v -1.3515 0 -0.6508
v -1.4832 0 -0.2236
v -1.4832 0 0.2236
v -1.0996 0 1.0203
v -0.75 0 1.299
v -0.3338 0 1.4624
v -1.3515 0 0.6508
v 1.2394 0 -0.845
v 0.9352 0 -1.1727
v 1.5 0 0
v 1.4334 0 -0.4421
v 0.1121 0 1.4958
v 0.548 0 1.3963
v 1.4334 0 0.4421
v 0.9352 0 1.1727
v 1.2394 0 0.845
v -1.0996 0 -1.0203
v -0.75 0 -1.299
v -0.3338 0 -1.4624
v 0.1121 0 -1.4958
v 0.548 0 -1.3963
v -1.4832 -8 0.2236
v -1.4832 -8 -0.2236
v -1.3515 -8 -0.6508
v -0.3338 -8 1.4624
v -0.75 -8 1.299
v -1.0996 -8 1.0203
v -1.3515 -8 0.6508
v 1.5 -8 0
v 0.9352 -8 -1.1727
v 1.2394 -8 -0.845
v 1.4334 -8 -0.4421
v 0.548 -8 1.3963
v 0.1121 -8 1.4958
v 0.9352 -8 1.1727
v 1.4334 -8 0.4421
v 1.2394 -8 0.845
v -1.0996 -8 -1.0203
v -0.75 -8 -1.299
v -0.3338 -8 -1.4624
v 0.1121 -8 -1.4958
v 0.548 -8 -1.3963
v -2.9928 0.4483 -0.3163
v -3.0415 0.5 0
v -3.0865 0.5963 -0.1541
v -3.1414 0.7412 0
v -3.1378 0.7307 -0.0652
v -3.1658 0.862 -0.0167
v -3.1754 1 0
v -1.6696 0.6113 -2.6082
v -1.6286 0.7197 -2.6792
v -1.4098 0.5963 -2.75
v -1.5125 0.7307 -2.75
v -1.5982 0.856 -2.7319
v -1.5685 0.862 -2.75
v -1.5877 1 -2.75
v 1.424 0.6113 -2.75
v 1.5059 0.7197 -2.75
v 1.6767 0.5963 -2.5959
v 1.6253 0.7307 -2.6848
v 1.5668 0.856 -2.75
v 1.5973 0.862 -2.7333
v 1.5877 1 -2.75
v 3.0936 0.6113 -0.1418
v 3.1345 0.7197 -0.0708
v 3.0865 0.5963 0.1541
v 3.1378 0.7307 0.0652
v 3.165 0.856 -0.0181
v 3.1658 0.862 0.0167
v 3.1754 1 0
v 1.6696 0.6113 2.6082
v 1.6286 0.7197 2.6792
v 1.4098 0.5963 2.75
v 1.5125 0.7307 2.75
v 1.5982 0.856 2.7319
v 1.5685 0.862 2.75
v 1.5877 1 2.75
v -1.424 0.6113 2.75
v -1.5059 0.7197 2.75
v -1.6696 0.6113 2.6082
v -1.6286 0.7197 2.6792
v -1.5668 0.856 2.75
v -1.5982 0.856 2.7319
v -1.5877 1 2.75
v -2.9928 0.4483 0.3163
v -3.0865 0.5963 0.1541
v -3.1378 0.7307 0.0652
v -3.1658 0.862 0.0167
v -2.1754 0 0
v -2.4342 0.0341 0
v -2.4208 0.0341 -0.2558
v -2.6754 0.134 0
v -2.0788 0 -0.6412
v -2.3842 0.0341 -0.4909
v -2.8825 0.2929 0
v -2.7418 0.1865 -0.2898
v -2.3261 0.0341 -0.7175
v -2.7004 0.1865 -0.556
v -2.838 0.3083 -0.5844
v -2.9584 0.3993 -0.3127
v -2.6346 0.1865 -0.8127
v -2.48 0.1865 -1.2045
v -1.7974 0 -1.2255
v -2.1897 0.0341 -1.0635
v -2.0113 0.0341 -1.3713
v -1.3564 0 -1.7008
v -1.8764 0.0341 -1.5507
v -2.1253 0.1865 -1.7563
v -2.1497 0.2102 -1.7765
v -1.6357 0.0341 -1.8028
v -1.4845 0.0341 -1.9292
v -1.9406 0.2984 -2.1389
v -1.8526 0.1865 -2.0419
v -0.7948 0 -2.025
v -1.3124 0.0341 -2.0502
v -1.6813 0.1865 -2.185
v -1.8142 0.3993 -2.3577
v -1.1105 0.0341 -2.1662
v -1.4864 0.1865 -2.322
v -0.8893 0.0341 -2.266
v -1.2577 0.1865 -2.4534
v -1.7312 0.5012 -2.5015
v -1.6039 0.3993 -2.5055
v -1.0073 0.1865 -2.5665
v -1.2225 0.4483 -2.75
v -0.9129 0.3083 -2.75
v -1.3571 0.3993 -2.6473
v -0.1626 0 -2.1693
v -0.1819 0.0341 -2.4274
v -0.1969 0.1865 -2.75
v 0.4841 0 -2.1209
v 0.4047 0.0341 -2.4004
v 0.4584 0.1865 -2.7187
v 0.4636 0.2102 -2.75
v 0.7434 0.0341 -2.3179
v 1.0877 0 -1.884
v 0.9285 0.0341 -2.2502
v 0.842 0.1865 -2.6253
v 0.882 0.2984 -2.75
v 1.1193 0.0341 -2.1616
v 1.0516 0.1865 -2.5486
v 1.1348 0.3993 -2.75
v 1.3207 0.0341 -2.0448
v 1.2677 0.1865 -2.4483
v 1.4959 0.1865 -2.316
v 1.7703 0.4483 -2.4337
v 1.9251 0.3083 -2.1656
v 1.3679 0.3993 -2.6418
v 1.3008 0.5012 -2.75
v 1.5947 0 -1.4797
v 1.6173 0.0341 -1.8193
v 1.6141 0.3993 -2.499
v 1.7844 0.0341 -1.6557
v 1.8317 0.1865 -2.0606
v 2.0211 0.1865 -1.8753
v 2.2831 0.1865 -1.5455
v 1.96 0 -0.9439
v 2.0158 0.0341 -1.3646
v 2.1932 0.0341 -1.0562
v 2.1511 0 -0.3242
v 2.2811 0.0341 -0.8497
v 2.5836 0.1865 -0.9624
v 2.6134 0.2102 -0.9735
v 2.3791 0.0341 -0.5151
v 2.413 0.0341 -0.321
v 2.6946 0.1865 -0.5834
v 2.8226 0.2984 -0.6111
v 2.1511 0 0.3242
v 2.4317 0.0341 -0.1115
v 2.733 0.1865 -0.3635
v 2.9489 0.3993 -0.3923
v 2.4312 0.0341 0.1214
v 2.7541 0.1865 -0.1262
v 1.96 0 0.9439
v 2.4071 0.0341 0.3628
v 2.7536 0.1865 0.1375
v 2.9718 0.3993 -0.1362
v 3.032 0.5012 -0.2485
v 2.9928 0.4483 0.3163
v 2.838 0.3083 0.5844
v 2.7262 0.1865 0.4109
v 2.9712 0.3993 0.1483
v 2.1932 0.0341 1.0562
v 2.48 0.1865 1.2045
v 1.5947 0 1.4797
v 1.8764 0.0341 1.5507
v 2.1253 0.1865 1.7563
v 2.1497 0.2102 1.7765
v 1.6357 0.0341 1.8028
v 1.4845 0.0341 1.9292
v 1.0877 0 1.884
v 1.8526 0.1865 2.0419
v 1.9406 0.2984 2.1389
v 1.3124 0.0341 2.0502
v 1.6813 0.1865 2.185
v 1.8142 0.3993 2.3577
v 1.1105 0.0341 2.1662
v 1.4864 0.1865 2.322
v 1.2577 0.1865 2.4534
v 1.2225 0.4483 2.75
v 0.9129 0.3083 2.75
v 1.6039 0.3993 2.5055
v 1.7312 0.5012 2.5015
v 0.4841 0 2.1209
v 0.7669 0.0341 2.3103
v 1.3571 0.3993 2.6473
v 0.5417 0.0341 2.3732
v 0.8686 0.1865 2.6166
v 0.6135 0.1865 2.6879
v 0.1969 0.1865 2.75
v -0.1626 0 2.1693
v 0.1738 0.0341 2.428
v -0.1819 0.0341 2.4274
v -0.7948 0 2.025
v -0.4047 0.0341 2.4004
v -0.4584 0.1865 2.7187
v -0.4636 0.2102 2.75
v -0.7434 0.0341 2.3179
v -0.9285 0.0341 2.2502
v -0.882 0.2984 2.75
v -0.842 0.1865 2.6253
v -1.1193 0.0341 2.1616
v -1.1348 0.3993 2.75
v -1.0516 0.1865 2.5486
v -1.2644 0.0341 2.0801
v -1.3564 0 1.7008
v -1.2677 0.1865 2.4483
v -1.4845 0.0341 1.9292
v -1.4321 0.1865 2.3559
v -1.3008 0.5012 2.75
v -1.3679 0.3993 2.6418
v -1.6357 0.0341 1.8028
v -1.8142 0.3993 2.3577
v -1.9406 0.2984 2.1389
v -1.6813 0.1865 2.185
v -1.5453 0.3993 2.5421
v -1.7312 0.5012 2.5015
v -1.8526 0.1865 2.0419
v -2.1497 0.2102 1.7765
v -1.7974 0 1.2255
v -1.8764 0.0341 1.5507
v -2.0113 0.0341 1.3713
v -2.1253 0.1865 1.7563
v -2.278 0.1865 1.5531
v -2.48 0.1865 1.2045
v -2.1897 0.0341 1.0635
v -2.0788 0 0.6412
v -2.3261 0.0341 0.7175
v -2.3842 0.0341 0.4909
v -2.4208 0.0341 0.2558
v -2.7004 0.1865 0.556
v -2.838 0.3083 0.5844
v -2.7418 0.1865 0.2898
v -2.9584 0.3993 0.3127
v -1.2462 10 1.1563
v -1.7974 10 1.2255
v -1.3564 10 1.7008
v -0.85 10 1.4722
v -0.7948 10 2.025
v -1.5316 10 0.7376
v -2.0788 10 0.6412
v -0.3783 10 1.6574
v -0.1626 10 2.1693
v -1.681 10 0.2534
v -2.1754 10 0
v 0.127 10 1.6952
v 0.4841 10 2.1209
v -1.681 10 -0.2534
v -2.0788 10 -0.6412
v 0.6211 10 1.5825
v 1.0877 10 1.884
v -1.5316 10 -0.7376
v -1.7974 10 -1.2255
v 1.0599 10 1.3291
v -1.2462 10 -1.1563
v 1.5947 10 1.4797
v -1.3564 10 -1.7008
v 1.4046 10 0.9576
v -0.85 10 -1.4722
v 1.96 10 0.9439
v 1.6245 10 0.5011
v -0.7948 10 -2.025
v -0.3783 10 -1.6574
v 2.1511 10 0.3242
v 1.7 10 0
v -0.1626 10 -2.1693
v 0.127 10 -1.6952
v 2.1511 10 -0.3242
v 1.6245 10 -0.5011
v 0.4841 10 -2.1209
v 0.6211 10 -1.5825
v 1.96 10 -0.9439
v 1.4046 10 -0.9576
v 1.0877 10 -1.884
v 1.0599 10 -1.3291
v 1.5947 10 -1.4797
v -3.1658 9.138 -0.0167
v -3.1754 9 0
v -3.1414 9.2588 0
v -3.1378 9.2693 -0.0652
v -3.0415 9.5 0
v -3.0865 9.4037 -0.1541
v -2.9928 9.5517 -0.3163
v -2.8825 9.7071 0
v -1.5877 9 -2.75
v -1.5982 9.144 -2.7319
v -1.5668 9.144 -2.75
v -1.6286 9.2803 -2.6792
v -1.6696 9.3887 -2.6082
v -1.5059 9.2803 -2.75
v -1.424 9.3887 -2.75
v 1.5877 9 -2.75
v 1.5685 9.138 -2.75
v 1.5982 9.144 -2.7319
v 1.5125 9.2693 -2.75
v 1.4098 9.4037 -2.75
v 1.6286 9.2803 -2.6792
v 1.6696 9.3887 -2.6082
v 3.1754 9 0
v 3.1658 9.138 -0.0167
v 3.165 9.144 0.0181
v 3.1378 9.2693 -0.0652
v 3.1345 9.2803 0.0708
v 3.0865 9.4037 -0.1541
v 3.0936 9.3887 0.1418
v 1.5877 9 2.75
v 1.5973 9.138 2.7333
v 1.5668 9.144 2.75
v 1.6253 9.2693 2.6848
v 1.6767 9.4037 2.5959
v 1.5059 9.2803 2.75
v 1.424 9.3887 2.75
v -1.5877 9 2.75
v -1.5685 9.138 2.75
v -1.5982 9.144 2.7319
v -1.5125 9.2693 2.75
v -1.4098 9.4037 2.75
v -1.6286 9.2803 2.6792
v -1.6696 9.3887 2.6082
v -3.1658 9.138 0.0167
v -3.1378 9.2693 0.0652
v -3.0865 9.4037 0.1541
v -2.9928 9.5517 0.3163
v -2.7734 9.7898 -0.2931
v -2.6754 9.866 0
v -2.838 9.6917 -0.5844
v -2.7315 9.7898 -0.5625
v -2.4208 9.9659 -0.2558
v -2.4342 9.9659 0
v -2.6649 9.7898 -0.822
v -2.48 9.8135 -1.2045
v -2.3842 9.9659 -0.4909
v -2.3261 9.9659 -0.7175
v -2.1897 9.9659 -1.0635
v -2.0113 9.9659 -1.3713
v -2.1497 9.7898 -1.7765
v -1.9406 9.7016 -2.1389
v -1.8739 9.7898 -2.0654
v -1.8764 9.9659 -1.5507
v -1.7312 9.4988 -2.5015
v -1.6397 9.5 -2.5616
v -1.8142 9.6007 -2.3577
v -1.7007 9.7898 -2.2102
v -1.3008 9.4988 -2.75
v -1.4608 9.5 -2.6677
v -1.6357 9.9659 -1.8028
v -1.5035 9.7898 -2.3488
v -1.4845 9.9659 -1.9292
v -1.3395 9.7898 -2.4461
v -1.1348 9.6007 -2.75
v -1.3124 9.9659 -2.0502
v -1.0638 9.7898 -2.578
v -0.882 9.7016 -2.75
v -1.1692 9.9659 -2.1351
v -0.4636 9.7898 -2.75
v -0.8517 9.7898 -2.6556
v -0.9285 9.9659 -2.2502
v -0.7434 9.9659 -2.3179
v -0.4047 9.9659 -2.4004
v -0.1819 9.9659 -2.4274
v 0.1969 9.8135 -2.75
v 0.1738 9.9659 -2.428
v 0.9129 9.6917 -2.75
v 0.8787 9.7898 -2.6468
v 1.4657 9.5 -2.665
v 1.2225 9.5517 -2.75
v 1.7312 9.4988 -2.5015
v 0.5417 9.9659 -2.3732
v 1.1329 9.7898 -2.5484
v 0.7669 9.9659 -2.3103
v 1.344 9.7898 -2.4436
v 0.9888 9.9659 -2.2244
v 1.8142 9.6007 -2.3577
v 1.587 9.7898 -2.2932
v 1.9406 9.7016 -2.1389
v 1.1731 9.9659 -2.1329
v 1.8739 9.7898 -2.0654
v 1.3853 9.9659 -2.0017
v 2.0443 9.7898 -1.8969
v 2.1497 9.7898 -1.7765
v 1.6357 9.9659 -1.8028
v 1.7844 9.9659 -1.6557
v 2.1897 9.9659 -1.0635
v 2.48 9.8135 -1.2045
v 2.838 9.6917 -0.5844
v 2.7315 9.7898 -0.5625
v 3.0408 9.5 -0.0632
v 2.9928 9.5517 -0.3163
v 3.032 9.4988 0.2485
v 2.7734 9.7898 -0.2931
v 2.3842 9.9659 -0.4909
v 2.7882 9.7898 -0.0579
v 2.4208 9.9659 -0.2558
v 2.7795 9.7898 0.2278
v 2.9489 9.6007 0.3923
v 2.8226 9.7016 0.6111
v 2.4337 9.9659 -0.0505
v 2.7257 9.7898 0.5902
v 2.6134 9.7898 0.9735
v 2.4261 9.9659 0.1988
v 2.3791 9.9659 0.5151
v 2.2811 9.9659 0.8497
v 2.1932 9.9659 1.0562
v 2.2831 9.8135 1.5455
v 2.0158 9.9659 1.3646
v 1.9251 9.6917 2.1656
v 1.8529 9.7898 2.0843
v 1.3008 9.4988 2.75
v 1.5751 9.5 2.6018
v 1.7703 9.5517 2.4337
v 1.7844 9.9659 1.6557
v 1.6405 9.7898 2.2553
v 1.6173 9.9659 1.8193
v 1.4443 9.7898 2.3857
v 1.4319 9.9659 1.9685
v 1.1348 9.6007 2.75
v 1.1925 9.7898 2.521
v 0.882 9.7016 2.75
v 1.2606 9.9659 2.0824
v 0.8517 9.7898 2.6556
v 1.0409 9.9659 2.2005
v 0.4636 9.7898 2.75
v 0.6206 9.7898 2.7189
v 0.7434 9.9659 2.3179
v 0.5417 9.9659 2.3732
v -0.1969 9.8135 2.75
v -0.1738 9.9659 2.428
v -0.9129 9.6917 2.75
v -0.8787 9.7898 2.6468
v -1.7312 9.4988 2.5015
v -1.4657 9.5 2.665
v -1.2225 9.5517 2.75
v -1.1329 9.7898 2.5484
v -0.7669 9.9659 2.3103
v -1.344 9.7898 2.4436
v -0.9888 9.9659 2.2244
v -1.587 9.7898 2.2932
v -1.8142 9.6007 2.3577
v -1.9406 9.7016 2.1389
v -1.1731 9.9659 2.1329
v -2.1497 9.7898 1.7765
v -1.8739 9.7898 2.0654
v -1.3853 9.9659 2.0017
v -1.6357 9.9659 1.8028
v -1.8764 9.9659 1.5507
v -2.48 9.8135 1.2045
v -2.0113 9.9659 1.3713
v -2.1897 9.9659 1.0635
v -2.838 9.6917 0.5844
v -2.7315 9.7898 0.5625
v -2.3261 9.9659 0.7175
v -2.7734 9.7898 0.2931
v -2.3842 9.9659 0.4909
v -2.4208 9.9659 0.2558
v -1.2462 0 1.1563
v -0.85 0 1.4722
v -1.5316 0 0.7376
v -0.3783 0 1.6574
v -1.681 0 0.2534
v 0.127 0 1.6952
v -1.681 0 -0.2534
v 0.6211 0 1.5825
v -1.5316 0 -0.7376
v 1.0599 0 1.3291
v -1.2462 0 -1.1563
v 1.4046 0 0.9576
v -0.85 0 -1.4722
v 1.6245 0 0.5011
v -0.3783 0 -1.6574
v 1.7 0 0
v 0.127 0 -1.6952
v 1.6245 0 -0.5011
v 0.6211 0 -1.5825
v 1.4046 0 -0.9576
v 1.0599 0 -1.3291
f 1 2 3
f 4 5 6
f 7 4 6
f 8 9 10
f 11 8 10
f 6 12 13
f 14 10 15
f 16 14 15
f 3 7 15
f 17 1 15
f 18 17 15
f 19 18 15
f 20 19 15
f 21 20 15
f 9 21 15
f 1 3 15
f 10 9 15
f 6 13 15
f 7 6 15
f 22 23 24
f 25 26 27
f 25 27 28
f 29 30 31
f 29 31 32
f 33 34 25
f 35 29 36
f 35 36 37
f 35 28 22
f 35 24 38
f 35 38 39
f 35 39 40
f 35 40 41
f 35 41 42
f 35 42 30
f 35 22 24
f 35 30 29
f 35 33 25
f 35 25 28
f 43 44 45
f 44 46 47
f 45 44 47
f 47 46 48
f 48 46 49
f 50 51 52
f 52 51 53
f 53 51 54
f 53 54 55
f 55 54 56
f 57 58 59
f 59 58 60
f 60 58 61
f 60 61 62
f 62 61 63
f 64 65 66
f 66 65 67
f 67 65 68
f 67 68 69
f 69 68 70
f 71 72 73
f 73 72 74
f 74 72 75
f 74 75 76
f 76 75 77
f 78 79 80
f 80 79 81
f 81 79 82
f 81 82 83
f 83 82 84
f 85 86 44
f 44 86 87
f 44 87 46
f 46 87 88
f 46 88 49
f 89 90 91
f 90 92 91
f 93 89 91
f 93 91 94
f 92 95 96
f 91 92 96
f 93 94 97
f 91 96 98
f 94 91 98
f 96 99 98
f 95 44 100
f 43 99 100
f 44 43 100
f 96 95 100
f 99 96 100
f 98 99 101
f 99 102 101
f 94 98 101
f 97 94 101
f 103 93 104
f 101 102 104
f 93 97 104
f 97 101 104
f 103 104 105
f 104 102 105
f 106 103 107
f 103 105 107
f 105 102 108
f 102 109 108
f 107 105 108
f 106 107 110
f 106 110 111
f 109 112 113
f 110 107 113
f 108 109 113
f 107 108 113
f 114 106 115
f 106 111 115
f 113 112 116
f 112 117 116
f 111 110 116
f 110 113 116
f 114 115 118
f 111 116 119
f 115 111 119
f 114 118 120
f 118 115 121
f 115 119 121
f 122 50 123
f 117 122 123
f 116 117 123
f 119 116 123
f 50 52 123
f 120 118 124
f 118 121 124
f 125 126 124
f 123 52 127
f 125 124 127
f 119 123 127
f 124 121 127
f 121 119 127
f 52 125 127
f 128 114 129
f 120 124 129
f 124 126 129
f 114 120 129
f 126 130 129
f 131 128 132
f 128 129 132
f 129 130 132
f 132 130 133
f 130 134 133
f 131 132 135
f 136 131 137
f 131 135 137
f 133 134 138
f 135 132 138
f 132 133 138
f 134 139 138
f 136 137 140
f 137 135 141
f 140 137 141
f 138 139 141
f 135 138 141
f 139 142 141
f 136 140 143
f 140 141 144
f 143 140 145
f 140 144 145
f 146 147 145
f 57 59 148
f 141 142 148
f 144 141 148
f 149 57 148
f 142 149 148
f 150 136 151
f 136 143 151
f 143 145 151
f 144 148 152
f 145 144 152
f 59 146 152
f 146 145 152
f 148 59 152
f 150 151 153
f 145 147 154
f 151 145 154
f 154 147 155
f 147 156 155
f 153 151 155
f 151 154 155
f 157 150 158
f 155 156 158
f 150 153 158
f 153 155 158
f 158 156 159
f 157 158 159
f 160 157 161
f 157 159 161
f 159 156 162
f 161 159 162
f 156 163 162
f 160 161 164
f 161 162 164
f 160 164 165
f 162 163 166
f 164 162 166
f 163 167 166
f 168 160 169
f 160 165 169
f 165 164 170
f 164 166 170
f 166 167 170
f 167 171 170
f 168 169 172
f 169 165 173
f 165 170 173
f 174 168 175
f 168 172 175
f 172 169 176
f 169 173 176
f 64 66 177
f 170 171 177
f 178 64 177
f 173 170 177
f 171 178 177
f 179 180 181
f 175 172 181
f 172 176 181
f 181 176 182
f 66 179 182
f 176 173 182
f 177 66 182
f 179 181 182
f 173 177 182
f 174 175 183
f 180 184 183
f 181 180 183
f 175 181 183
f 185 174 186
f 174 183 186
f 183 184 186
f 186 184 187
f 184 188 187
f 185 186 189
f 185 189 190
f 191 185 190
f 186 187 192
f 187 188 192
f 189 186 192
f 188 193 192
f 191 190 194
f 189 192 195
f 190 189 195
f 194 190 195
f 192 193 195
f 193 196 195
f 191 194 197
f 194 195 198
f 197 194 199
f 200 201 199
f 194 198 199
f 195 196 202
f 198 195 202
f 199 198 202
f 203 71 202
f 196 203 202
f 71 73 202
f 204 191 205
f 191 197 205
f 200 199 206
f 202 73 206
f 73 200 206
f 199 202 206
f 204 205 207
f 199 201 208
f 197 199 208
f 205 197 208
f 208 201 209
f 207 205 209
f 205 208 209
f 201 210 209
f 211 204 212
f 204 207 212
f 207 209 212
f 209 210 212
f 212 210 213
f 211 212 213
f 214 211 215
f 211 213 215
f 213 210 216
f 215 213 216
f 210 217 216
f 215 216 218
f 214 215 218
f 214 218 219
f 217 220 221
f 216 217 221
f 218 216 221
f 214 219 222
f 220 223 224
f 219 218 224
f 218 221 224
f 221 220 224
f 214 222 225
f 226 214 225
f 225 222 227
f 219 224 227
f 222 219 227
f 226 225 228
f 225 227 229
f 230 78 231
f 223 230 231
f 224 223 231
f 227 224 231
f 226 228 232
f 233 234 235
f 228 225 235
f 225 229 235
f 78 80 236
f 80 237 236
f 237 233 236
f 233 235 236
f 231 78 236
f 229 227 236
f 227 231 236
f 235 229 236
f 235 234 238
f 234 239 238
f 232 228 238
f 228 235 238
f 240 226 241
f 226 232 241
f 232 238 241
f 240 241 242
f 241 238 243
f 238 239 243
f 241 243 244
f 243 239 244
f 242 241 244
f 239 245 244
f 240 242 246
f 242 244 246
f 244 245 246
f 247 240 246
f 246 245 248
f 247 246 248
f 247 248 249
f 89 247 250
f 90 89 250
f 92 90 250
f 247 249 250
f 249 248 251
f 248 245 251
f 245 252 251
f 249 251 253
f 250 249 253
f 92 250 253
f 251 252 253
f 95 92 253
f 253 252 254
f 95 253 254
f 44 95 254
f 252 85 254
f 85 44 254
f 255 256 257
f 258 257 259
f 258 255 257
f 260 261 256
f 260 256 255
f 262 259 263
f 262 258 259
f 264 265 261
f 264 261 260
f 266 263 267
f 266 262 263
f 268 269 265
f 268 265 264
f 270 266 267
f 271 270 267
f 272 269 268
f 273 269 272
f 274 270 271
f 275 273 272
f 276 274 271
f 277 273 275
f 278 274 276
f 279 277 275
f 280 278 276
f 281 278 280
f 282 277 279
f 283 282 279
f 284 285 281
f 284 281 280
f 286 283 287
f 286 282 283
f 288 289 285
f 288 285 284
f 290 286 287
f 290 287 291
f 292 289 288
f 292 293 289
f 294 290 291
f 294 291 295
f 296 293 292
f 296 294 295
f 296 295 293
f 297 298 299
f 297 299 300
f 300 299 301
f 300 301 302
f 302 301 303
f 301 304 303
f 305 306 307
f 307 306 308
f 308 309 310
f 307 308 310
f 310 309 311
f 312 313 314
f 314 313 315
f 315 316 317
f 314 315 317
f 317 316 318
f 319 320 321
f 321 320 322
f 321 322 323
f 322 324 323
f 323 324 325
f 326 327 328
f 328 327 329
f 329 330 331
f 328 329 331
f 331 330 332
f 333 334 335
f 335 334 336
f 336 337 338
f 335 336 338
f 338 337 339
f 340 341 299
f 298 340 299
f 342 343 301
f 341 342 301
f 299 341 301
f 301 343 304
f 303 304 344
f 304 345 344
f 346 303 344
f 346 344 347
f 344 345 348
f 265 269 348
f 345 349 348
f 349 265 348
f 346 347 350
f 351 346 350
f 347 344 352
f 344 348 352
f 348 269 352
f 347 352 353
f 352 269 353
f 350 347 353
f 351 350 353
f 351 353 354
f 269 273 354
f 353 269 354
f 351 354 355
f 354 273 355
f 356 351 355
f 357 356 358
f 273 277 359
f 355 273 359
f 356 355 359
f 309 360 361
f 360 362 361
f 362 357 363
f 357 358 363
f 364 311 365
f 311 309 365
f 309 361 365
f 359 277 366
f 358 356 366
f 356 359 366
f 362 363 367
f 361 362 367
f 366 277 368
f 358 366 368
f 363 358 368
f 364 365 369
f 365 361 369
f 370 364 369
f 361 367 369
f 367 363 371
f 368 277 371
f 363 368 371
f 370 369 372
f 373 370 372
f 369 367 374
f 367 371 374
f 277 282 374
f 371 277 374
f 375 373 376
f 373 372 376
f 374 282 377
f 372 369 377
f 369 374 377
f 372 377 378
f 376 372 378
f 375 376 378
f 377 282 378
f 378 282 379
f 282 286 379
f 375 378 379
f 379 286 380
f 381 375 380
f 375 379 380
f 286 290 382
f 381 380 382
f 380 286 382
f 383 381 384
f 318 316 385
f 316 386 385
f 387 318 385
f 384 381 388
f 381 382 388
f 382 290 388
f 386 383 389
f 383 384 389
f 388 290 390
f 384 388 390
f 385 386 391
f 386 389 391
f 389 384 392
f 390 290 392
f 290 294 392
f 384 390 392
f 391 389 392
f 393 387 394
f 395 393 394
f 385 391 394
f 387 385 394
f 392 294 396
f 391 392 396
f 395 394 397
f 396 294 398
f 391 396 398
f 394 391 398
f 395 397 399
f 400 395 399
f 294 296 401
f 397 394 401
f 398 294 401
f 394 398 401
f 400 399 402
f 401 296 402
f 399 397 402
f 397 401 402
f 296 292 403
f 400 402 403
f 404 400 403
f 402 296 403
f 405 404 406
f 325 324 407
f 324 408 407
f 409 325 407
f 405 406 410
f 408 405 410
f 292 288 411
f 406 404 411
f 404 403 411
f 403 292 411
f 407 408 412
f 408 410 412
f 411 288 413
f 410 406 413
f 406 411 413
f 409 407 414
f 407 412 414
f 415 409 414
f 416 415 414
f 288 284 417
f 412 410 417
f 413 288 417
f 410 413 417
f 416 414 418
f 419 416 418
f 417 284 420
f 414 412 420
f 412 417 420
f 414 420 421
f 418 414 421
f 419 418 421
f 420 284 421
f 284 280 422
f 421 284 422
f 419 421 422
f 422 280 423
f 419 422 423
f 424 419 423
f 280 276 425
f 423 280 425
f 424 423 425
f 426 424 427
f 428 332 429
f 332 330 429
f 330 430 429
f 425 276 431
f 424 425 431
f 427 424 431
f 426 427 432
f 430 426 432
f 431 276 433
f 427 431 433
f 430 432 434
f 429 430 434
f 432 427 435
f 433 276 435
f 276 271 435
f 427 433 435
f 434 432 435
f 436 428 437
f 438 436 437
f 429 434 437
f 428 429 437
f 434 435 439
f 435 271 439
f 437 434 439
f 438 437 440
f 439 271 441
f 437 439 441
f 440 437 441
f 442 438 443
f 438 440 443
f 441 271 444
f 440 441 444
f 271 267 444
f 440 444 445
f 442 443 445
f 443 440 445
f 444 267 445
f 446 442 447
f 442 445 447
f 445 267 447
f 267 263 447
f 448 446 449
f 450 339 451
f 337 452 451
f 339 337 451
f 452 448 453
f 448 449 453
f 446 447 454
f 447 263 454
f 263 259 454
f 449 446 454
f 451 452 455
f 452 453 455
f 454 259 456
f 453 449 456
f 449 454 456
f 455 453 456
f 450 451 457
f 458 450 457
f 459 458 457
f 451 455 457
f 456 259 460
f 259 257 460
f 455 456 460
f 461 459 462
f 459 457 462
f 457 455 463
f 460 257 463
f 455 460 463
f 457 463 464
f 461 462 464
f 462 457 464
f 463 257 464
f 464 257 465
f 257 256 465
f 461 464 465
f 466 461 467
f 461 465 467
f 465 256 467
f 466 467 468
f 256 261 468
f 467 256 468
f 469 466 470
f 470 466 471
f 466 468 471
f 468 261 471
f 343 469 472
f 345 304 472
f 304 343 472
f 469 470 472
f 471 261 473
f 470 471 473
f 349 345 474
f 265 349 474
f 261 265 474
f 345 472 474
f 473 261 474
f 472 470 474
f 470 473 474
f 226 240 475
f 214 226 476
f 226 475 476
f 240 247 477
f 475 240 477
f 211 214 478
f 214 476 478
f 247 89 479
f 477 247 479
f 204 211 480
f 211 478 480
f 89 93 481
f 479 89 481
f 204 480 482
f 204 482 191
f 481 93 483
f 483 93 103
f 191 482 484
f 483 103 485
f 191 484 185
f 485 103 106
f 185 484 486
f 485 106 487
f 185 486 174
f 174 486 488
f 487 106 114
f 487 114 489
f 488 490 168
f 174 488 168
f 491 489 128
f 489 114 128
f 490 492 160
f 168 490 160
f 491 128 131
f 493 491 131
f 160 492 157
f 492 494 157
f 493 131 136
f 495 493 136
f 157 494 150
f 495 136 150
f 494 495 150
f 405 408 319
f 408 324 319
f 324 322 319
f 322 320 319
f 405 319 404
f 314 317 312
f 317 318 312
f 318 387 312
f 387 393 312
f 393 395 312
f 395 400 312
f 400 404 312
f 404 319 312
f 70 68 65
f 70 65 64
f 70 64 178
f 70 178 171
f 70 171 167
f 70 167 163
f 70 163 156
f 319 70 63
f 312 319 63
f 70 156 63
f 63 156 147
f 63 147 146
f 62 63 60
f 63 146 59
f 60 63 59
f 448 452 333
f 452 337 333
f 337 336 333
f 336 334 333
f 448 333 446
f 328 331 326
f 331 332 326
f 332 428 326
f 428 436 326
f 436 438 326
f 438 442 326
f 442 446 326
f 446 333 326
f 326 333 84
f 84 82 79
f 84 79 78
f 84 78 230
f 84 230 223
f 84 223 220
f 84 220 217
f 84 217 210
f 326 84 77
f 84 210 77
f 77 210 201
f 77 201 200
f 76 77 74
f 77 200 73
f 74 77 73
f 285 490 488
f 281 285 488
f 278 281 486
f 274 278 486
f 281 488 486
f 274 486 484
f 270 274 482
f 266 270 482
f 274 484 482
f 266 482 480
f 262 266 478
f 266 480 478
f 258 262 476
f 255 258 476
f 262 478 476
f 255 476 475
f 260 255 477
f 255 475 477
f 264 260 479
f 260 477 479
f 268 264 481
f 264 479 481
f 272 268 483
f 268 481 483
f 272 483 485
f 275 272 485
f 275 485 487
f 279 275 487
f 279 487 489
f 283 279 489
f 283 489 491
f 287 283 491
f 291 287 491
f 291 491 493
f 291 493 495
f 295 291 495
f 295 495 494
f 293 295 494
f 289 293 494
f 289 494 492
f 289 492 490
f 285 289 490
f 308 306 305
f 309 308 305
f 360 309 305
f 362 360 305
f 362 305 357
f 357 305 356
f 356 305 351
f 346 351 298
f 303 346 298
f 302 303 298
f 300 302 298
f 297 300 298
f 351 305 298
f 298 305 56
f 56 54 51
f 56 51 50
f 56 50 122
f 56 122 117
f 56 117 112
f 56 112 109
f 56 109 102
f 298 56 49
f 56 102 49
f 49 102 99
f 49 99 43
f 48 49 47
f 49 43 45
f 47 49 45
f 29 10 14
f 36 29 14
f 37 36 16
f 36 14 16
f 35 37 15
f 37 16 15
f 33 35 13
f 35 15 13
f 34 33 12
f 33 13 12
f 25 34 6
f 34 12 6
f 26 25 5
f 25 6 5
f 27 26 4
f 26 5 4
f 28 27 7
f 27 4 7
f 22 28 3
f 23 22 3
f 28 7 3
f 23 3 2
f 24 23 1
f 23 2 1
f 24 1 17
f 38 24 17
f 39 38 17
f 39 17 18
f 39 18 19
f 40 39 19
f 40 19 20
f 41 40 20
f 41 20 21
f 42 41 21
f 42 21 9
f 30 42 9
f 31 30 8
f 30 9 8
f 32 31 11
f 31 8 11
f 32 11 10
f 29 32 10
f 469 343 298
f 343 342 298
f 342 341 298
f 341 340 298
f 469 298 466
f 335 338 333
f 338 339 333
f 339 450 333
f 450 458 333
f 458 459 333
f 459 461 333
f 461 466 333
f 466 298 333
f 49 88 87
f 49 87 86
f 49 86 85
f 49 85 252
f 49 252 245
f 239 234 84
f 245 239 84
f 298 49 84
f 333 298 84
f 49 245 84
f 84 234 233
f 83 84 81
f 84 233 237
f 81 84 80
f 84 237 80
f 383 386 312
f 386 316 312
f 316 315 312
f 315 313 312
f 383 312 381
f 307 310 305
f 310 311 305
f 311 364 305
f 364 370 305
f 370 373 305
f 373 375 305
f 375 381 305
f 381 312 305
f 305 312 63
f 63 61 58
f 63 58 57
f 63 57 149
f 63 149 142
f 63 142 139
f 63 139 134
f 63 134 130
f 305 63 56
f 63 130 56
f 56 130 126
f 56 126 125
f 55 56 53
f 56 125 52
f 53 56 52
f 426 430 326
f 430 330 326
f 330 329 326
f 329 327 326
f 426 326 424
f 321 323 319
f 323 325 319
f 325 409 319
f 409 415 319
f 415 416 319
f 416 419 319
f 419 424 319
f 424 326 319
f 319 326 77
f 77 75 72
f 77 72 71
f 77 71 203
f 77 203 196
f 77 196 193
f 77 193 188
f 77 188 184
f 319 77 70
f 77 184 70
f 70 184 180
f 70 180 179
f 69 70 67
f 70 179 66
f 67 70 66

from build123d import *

# Parameters (mm, degrees)
BOSS_EXTRUDE1_DEPTH      = 10
M3_CLEARANCE_HOLE1_D     = 3.4
M3_CLEARANCE_HOLE1_DEPTH = 12
M3_CLEARANCE_HOLE1_TIP   = 1.021463052
SKETCH5_R                = 1.5
BOSS_EXTRUDE2_DEPTH      = 8


with BuildPart() as part:
    # Sketch1 → Boss-Extrude1 (new body)
    with BuildSketch(Plane(origin=(0, 0, 0), x_dir=(1, 0, 0), z_dir=(0, 1, 0))):
        Polygon((3.175426481, 0), (1.58771324, 2.75), (-1.58771324, 2.75), (-3.175426481, 0), (-1.58771324, -2.75), (1.58771324, -2.75), align=None)
    extrude(amount=BOSS_EXTRUDE1_DEPTH)

    # M3 Clearance Hole1
    with Locations(Plane(origin=(0, 10, 0), x_dir=(-1, 0, 0), z_dir=(0, 1, 0))):
        with Locations((0, 0)):
            Hole(M3_CLEARANCE_HOLE1_D / 2, depth=M3_CLEARANCE_HOLE1_DEPTH)
            with Locations((0, 0, -(M3_CLEARANCE_HOLE1_DEPTH + M3_CLEARANCE_HOLE1_TIP / 2))):  # 118° drill point
                Cone(0, M3_CLEARANCE_HOLE1_D / 2, M3_CLEARANCE_HOLE1_TIP, mode=Mode.SUBTRACT)

    # Sketch4 → Cut-Revolve1 (revolve, cut)
    with BuildSketch(Plane.XY):
        with BuildLine():
            Line((-2.175426481, 10), (-3.175426481, 10))
            Line((-3.175426481, 10), (-3.175426481, 9))
            ThreePointArc((-3.175426481, 9), (-2.882533262, 9.707106781), (-2.175426481, 10))
        make_face()
        with BuildLine():
            Line((-3.175426481, 1), (-3.175426481, 0))
            Line((-3.175426481, 0), (-2.175426481, 0))
            ThreePointArc((-2.175426481, 0), (-2.882533262, 0.292893219), (-3.175426481, 1))
        make_face()
    revolve(axis=Axis((0, 10, 0), (0, -1, 0)), mode=Mode.SUBTRACT)


with BuildPart() as body_2:
    # Sketch5 → Boss-Extrude2 (new body)
    with BuildSketch(Plane.XZ):
        Circle(SKETCH5_R)
    extrude(amount=BOSS_EXTRUDE2_DEPTH)


solid = Compound([part.part, body_2.part])
